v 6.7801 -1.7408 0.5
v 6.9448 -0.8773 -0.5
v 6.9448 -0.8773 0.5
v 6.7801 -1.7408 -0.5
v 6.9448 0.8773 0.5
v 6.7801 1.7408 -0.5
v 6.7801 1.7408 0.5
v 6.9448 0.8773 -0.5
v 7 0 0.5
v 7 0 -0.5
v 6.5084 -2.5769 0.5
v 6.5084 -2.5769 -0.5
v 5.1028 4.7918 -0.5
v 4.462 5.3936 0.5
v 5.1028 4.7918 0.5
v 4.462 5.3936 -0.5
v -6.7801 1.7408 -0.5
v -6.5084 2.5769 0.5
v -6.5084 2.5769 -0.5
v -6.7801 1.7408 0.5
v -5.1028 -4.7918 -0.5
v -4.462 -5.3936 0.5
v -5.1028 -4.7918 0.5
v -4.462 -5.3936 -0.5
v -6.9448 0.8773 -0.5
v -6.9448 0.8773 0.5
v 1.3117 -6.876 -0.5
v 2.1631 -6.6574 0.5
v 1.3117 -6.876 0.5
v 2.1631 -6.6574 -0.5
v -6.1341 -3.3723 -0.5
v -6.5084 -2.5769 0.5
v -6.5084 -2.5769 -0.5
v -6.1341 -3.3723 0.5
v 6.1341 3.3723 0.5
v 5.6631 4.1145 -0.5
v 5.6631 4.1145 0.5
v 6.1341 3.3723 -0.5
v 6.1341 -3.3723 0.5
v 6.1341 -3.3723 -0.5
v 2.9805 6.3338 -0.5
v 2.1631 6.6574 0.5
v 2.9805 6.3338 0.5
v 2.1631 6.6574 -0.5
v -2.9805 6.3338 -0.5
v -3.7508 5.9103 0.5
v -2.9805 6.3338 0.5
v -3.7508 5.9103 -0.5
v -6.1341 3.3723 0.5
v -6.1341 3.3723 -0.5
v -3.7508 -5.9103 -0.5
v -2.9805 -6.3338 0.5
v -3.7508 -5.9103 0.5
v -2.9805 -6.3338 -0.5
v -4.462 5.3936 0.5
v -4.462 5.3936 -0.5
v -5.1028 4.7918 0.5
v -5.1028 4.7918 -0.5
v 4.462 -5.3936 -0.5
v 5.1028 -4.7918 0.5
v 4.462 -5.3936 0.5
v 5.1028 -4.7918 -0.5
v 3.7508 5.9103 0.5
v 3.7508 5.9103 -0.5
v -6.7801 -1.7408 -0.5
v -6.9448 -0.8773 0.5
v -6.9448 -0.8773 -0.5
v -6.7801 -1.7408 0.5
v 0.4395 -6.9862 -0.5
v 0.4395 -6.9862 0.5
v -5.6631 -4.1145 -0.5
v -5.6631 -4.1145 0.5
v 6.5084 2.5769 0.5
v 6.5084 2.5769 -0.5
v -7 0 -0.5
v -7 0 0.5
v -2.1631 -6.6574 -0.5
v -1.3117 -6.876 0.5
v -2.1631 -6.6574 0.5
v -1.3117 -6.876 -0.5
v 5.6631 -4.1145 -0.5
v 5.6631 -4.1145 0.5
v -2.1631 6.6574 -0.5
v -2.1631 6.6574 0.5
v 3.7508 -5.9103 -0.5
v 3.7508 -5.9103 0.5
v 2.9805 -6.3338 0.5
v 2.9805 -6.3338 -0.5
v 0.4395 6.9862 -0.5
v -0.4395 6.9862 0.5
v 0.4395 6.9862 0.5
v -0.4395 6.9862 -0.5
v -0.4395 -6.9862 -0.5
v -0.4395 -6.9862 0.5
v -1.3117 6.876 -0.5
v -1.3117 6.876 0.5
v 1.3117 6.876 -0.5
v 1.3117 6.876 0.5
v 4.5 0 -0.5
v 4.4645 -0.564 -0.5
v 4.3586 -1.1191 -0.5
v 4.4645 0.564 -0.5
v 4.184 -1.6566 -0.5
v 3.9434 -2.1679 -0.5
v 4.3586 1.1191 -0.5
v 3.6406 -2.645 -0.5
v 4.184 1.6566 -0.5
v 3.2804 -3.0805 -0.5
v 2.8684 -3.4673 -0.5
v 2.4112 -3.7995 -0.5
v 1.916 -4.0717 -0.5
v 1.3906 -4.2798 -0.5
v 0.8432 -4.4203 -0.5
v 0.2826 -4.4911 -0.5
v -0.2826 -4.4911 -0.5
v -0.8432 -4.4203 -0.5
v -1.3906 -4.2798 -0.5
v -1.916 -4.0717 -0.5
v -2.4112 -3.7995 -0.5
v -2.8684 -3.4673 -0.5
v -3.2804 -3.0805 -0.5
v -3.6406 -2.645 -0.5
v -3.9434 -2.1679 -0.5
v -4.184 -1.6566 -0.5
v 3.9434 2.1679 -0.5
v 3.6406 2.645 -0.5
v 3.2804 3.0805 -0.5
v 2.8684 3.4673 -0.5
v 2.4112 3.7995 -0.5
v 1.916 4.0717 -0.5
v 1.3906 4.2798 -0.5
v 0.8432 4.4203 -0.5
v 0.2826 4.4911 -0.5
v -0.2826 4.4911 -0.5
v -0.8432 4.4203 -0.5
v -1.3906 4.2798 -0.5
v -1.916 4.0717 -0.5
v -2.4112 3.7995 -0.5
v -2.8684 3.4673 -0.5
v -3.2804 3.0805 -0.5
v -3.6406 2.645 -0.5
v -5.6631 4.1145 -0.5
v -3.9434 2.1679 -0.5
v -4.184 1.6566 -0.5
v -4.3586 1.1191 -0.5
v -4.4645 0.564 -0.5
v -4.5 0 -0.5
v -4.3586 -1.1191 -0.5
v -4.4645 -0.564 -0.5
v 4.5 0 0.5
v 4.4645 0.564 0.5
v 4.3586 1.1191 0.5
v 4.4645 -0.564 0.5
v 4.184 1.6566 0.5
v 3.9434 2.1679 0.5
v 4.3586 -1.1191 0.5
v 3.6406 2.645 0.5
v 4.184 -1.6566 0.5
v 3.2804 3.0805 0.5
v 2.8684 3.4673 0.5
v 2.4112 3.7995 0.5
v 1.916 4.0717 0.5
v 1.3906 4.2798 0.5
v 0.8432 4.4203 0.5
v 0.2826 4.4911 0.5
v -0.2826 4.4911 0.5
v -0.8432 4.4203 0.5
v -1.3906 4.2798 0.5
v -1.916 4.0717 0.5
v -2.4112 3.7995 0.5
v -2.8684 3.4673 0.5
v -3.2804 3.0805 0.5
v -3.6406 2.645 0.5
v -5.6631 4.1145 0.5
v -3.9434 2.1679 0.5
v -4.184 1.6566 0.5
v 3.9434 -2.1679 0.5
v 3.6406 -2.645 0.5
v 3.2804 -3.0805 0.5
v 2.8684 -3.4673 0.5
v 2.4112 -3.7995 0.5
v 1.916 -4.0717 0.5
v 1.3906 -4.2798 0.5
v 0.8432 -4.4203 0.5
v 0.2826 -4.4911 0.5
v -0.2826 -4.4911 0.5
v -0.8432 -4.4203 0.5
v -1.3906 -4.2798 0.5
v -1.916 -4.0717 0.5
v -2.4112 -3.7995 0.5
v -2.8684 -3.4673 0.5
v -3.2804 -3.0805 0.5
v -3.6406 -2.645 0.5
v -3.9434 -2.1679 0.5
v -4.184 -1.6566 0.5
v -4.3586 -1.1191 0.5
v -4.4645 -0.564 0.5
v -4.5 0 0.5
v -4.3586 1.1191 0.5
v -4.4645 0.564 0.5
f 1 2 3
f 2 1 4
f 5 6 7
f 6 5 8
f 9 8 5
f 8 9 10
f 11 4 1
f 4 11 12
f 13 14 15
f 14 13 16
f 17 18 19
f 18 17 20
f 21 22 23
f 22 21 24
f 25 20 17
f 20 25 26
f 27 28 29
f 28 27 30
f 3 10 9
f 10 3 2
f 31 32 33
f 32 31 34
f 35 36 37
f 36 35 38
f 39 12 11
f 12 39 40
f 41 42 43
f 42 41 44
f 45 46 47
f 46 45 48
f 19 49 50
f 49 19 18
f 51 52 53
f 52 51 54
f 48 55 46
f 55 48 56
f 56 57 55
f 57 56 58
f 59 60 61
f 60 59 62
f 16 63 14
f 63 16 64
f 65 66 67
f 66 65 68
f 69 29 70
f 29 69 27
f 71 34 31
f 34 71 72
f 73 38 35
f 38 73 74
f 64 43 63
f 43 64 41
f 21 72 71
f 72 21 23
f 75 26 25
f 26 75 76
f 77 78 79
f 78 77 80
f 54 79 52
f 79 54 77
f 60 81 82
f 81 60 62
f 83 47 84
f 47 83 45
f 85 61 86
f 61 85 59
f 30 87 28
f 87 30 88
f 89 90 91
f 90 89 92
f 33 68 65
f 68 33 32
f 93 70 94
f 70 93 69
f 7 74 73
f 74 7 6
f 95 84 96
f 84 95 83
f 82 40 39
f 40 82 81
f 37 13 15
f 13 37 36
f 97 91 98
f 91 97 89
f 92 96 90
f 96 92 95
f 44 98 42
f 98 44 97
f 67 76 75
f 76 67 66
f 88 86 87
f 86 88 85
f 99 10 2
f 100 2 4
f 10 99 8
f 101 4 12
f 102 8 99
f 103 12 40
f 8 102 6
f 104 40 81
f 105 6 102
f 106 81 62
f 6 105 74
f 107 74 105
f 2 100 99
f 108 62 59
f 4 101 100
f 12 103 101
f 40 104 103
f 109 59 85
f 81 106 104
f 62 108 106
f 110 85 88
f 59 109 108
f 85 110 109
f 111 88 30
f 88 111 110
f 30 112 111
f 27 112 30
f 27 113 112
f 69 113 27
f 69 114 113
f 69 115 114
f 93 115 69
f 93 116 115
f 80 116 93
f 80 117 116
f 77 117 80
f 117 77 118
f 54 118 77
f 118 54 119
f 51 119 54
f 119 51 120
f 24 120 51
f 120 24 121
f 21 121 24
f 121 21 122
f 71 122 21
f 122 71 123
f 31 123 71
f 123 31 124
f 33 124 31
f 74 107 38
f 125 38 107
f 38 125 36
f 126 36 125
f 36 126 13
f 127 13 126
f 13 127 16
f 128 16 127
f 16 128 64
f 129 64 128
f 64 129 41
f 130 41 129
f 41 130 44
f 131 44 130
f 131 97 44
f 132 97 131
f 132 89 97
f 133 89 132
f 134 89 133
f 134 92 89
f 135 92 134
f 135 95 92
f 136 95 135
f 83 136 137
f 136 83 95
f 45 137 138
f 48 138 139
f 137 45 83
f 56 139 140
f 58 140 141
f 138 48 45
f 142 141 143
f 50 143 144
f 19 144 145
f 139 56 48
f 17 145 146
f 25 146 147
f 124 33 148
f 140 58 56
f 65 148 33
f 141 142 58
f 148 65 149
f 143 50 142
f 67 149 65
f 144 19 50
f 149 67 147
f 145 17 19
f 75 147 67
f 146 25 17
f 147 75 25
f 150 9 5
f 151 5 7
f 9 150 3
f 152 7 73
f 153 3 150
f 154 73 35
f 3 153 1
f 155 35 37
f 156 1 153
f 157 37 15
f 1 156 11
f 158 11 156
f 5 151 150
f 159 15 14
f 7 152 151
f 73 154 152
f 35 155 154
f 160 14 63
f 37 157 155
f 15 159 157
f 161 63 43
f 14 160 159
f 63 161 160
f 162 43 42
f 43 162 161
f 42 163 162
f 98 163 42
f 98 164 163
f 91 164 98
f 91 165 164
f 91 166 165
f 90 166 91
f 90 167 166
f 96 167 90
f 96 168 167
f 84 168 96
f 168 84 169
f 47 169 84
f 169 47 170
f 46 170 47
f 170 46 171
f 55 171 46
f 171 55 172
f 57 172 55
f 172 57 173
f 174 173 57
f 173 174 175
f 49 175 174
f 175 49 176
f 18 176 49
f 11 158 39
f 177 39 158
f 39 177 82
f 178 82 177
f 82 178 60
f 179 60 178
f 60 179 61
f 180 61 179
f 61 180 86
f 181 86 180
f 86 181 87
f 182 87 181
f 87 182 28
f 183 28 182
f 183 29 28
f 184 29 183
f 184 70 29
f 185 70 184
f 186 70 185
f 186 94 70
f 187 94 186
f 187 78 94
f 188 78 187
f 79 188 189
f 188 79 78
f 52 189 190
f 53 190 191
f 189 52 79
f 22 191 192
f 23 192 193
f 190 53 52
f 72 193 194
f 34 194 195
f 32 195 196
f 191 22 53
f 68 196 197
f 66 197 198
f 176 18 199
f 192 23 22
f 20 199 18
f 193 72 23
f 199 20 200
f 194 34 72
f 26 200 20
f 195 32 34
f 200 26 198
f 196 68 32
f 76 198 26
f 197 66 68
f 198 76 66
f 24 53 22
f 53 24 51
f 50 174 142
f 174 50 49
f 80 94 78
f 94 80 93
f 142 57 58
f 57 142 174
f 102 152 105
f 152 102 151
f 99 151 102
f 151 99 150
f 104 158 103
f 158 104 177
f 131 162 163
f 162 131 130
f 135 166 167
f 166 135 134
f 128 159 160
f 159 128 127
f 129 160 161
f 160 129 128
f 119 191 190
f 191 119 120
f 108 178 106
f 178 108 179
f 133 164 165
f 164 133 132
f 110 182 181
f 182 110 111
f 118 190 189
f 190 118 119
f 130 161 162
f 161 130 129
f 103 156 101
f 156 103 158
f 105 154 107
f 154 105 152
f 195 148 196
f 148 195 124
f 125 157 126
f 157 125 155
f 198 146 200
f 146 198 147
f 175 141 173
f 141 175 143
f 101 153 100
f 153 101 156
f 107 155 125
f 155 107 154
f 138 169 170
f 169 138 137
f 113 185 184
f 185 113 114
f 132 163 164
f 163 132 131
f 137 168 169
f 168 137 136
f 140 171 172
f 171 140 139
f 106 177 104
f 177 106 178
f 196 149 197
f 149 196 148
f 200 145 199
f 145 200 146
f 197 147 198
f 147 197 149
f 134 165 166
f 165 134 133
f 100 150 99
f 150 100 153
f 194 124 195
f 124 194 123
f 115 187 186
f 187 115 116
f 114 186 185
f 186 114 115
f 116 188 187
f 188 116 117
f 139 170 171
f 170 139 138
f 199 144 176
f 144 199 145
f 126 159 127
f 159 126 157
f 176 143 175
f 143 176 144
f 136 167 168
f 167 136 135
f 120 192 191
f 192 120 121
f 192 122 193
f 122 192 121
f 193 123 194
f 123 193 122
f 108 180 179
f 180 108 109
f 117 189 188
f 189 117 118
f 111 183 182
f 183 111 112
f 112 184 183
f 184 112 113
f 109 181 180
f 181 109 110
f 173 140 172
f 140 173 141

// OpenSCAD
$fn = 50;


difference() {
	union() {
		translate(v = [0, 0, -0.5000000000]) {
			cylinder(h = 1, r = 7.0000000000);
		}
	}
	union() {
		translate(v = [0, 0, -100.0000000000]) {
			cylinder(h = 200, r = 4.5000000000);
		}
	}
}
